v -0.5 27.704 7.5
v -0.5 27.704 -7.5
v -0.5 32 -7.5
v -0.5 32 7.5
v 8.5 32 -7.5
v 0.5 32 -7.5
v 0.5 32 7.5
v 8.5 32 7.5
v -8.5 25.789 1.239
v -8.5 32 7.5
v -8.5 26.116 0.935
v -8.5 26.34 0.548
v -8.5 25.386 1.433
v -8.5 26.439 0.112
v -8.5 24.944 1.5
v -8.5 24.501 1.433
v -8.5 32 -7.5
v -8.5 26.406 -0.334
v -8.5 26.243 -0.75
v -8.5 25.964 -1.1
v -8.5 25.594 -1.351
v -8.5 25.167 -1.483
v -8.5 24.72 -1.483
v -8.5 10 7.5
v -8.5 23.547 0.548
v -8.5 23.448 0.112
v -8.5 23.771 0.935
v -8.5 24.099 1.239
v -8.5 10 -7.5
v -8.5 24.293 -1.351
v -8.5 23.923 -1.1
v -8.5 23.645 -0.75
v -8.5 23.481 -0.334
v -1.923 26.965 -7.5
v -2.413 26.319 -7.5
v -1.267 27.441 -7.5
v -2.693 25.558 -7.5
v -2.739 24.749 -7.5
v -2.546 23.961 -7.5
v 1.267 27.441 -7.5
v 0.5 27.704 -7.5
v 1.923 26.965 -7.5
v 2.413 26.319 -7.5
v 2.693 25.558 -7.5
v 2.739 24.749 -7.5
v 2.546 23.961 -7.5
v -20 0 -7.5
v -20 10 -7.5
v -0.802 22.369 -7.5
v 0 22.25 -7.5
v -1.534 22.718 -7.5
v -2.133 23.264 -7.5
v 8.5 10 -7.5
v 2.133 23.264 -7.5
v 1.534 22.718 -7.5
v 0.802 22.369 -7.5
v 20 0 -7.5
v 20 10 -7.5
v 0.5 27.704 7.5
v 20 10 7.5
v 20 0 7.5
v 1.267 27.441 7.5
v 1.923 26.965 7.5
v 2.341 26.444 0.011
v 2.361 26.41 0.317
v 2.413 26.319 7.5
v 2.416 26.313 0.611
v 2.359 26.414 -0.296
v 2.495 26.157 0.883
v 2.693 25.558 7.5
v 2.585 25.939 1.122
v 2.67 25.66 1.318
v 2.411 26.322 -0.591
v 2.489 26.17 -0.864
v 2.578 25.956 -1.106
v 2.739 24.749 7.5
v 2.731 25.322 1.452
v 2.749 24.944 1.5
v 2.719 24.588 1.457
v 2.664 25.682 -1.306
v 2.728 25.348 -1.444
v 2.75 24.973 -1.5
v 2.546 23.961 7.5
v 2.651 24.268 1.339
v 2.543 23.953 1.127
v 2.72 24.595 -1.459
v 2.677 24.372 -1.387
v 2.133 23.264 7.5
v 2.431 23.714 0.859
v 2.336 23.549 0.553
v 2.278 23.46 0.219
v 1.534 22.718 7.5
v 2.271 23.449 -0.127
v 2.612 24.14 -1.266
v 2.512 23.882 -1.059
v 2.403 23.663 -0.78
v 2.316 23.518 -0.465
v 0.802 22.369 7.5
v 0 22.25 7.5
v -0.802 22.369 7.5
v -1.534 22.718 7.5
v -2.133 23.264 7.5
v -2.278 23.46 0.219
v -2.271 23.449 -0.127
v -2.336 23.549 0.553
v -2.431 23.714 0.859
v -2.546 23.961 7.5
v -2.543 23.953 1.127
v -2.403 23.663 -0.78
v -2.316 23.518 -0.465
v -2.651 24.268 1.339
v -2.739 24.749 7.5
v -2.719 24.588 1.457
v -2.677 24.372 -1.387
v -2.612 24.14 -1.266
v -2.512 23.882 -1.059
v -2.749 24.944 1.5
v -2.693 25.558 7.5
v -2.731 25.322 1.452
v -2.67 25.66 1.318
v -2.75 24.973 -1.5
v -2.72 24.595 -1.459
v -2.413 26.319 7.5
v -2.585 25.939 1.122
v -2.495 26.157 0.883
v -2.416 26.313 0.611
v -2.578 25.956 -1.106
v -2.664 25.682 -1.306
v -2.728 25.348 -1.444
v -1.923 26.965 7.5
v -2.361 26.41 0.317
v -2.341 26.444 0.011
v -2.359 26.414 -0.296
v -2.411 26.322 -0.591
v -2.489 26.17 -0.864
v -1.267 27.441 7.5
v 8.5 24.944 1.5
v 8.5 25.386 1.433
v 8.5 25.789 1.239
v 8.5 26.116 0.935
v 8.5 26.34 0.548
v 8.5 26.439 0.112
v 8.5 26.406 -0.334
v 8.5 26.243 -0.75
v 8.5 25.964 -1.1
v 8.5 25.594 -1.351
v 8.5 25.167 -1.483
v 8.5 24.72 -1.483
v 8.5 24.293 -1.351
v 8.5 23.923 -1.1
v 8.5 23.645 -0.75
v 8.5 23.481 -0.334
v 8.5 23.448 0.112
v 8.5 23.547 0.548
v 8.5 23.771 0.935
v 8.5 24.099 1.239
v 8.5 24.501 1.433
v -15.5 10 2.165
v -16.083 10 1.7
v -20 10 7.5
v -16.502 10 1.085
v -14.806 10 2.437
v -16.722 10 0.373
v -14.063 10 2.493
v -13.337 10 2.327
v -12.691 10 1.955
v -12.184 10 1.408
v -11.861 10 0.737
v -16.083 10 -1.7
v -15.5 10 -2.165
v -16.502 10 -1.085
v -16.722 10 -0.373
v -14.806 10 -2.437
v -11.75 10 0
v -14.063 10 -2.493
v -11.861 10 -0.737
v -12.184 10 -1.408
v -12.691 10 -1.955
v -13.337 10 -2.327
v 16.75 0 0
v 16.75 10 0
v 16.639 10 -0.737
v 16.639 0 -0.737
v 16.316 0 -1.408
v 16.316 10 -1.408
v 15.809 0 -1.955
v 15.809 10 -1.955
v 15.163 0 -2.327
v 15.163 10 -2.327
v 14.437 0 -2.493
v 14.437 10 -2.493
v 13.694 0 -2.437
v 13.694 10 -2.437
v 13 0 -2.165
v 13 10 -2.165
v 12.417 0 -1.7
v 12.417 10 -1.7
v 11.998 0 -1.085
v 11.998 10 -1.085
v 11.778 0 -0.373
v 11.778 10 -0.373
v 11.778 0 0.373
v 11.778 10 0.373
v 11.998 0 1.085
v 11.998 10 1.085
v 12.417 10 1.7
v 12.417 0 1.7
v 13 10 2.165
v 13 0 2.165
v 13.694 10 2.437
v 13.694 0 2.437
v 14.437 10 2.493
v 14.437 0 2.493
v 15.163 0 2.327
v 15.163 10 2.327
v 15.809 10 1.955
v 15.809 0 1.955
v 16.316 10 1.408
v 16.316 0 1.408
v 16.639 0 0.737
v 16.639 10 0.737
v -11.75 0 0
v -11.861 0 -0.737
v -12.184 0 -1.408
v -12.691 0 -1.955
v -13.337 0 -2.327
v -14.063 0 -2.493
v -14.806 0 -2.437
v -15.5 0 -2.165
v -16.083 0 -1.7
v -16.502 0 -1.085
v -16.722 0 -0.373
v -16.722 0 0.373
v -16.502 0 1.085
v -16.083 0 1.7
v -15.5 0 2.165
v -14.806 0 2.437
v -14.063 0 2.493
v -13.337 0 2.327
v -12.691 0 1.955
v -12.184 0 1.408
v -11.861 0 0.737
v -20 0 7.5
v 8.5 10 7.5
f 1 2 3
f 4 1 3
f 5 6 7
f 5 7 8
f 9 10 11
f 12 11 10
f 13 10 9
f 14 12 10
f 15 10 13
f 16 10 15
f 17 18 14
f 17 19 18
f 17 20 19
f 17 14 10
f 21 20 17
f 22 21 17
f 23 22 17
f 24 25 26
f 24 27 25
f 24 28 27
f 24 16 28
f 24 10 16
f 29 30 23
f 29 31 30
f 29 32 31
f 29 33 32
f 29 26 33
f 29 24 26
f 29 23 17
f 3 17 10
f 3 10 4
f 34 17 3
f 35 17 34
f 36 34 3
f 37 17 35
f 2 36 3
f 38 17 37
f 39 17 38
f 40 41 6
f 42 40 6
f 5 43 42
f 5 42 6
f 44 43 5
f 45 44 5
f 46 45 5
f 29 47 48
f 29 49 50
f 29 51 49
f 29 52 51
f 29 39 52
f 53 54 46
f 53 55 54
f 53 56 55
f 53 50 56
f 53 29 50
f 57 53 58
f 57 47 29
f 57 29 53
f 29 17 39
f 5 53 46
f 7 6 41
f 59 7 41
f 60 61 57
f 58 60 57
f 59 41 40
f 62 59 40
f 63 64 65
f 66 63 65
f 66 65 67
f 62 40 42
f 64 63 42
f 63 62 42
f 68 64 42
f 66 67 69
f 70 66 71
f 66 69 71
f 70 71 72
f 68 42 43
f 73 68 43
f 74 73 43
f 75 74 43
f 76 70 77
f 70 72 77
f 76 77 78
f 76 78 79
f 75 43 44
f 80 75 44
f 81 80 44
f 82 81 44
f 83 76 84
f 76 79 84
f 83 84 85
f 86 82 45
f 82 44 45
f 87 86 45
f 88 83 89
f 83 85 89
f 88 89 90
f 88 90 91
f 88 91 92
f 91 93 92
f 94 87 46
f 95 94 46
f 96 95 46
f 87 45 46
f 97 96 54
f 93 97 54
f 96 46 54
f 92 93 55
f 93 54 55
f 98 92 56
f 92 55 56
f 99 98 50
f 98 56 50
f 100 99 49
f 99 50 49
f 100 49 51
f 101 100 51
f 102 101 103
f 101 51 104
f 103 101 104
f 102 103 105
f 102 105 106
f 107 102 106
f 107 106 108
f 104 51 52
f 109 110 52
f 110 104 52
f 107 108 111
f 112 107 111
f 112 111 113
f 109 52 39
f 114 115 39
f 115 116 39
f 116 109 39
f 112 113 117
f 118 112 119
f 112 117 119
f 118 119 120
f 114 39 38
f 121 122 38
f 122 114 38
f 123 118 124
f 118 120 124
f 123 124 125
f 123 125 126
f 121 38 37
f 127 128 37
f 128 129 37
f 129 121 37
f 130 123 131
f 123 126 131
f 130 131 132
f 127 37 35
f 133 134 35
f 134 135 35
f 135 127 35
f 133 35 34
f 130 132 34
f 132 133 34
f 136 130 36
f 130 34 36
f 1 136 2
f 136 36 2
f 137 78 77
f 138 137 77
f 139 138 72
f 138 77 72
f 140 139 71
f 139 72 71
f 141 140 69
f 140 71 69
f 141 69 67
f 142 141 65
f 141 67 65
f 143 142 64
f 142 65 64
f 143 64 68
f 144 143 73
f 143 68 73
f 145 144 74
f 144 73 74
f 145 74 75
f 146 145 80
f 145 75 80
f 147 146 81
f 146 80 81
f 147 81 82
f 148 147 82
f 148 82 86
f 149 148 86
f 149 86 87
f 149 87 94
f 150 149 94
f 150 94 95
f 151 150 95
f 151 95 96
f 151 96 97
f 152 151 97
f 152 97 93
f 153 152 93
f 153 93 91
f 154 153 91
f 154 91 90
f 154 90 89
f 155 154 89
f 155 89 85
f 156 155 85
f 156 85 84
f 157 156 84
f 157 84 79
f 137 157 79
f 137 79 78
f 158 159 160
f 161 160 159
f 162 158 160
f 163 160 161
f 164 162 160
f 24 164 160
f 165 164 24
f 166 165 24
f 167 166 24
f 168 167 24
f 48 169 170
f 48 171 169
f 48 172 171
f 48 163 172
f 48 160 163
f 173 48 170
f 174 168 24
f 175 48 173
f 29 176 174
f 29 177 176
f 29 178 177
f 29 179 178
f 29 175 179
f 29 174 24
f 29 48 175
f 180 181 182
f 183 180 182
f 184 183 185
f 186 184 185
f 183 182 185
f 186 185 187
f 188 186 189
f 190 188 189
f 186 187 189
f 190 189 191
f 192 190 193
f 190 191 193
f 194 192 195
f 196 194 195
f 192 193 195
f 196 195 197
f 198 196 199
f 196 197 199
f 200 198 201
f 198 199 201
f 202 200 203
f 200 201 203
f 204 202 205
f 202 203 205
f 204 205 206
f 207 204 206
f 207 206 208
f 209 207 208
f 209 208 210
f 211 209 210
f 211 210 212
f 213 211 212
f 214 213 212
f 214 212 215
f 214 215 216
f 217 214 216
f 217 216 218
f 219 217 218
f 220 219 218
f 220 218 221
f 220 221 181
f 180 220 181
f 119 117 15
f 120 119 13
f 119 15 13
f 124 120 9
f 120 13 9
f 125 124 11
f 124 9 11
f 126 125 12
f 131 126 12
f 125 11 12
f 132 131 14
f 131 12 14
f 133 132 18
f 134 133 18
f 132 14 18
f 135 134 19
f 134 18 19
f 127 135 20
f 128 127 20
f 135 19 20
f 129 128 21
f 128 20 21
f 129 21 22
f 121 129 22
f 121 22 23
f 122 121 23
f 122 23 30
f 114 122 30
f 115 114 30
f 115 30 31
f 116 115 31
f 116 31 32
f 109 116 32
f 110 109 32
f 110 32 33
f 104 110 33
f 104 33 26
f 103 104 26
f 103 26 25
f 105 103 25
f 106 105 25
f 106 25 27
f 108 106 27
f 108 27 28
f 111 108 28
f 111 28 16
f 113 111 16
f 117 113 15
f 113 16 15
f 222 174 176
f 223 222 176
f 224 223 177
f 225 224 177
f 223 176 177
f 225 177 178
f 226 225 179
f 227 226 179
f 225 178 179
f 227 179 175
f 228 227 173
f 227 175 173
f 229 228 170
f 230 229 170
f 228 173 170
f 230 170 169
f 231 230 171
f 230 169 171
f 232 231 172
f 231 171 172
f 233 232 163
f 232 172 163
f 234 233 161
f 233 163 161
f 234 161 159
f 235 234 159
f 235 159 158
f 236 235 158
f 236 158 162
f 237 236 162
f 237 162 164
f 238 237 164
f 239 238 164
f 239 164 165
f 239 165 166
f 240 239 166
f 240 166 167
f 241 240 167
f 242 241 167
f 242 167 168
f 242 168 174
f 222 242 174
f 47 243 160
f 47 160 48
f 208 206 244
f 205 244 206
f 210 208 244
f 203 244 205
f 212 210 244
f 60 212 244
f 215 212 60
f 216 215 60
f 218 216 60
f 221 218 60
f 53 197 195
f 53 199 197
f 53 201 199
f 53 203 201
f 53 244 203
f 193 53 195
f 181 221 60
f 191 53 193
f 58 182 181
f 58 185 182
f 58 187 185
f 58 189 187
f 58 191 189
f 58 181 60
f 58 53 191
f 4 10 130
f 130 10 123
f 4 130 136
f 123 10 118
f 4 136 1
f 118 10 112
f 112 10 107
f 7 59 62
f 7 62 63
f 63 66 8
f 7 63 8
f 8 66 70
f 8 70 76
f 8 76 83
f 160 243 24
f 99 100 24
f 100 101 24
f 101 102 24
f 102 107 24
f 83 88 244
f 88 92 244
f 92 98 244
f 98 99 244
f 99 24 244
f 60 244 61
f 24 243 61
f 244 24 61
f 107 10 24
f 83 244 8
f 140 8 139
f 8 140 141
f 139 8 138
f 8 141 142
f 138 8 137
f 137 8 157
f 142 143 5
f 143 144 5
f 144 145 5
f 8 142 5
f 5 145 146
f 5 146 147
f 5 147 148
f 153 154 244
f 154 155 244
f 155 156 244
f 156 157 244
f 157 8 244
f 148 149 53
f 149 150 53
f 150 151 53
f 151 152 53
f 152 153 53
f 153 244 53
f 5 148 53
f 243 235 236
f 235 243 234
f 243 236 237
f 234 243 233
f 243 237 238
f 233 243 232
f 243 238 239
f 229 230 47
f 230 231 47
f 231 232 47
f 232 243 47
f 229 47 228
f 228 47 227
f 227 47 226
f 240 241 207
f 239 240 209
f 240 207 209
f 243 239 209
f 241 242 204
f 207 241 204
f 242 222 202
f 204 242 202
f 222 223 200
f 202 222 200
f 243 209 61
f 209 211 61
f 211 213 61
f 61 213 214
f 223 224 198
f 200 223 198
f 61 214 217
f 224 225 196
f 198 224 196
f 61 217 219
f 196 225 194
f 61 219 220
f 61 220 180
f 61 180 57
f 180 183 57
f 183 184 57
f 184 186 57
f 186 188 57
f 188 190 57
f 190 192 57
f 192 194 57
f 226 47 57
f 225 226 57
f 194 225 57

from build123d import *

# Parameters (mm, degrees)
CROQUIS1_W              = 17
CROQUIS1_H              = 15
SALIENTE_EXTRUIR1_DEPTH = 32
CROQUIS1_3_W            = 11.5
CROQUIS1_3_H            = 15
SALIENTE_EXTRUIR2_DEPTH = 10
CORTAR_EXTRUIR1_DEPTH   = 20
CROQUIS3_R              = 2.5
CORTAR_EXTRUIR2_DEPTH   = 20
CROQUIS4_R              = 1.5
CORTAR_EXTRUIR3_DEPTH   = 20


with BuildPart() as part:
    # Croquis1 → Saliente-Extruir1 (new body)
    with BuildSketch(Plane(origin=(0, 0, 0), x_dir=(1, 0, 0), z_dir=(0, 1, 0))):
        Rectangle(CROQUIS1_W, CROQUIS1_H)
    extrude(amount=SALIENTE_EXTRUIR1_DEPTH)

    # Croquis1<3> → Saliente-Extruir2 (add)
    with BuildSketch(Plane(origin=(0, 0, 0), x_dir=(1, 0, 0), z_dir=(0, 1, 0))):
        with Locations((-14.25, 0)):
            Rectangle(CROQUIS1_3_W, CROQUIS1_3_H)
        with Locations((14.25, 0)):
            Rectangle(CROQUIS1_3_W, CROQUIS1_3_H)
    extrude(amount=SALIENTE_EXTRUIR2_DEPTH)

    # Croquis2 → Cortar-Extruir1 (cut)
    with BuildSketch(Plane(origin=(0, 0, -7.5), x_dir=(-1, 0, 0), z_dir=(0, 0, -1))):
        with BuildLine():
            Line((0.5, 32), (-0.5, 32))
            Line((-0.5, 32), (-0.5, 27.704163457))
            ThreePointArc((-0.5, 27.704163457), (0, 22.25), (0.5, 27.704163457))
            Line((0.5, 27.704163457), (0.5, 32))
        make_face()
    extrude(amount=-CORTAR_EXTRUIR1_DEPTH, mode=Mode.SUBTRACT)

    # Croquis3 → Cortar-Extruir2 (cut)
    with BuildSketch(Plane(origin=(0, 10, 0), x_dir=(1, 0, 0), z_dir=(0, 1, 0))):
        with Locations((14.25, 0)):
            Circle(CROQUIS3_R)
        with Locations((-14.25, 0)):
            Circle(CROQUIS3_R)
    extrude(amount=-CORTAR_EXTRUIR2_DEPTH, mode=Mode.SUBTRACT)

    # Croquis4 → Cortar-Extruir3 (cut)
    with BuildSketch(Plane.ZY.offset(8.5)):
        with Locations((0, 24.943618043)):
            Circle(CROQUIS4_R)
    extrude(amount=-CORTAR_EXTRUIR3_DEPTH, mode=Mode.SUBTRACT)


solid = part.part
